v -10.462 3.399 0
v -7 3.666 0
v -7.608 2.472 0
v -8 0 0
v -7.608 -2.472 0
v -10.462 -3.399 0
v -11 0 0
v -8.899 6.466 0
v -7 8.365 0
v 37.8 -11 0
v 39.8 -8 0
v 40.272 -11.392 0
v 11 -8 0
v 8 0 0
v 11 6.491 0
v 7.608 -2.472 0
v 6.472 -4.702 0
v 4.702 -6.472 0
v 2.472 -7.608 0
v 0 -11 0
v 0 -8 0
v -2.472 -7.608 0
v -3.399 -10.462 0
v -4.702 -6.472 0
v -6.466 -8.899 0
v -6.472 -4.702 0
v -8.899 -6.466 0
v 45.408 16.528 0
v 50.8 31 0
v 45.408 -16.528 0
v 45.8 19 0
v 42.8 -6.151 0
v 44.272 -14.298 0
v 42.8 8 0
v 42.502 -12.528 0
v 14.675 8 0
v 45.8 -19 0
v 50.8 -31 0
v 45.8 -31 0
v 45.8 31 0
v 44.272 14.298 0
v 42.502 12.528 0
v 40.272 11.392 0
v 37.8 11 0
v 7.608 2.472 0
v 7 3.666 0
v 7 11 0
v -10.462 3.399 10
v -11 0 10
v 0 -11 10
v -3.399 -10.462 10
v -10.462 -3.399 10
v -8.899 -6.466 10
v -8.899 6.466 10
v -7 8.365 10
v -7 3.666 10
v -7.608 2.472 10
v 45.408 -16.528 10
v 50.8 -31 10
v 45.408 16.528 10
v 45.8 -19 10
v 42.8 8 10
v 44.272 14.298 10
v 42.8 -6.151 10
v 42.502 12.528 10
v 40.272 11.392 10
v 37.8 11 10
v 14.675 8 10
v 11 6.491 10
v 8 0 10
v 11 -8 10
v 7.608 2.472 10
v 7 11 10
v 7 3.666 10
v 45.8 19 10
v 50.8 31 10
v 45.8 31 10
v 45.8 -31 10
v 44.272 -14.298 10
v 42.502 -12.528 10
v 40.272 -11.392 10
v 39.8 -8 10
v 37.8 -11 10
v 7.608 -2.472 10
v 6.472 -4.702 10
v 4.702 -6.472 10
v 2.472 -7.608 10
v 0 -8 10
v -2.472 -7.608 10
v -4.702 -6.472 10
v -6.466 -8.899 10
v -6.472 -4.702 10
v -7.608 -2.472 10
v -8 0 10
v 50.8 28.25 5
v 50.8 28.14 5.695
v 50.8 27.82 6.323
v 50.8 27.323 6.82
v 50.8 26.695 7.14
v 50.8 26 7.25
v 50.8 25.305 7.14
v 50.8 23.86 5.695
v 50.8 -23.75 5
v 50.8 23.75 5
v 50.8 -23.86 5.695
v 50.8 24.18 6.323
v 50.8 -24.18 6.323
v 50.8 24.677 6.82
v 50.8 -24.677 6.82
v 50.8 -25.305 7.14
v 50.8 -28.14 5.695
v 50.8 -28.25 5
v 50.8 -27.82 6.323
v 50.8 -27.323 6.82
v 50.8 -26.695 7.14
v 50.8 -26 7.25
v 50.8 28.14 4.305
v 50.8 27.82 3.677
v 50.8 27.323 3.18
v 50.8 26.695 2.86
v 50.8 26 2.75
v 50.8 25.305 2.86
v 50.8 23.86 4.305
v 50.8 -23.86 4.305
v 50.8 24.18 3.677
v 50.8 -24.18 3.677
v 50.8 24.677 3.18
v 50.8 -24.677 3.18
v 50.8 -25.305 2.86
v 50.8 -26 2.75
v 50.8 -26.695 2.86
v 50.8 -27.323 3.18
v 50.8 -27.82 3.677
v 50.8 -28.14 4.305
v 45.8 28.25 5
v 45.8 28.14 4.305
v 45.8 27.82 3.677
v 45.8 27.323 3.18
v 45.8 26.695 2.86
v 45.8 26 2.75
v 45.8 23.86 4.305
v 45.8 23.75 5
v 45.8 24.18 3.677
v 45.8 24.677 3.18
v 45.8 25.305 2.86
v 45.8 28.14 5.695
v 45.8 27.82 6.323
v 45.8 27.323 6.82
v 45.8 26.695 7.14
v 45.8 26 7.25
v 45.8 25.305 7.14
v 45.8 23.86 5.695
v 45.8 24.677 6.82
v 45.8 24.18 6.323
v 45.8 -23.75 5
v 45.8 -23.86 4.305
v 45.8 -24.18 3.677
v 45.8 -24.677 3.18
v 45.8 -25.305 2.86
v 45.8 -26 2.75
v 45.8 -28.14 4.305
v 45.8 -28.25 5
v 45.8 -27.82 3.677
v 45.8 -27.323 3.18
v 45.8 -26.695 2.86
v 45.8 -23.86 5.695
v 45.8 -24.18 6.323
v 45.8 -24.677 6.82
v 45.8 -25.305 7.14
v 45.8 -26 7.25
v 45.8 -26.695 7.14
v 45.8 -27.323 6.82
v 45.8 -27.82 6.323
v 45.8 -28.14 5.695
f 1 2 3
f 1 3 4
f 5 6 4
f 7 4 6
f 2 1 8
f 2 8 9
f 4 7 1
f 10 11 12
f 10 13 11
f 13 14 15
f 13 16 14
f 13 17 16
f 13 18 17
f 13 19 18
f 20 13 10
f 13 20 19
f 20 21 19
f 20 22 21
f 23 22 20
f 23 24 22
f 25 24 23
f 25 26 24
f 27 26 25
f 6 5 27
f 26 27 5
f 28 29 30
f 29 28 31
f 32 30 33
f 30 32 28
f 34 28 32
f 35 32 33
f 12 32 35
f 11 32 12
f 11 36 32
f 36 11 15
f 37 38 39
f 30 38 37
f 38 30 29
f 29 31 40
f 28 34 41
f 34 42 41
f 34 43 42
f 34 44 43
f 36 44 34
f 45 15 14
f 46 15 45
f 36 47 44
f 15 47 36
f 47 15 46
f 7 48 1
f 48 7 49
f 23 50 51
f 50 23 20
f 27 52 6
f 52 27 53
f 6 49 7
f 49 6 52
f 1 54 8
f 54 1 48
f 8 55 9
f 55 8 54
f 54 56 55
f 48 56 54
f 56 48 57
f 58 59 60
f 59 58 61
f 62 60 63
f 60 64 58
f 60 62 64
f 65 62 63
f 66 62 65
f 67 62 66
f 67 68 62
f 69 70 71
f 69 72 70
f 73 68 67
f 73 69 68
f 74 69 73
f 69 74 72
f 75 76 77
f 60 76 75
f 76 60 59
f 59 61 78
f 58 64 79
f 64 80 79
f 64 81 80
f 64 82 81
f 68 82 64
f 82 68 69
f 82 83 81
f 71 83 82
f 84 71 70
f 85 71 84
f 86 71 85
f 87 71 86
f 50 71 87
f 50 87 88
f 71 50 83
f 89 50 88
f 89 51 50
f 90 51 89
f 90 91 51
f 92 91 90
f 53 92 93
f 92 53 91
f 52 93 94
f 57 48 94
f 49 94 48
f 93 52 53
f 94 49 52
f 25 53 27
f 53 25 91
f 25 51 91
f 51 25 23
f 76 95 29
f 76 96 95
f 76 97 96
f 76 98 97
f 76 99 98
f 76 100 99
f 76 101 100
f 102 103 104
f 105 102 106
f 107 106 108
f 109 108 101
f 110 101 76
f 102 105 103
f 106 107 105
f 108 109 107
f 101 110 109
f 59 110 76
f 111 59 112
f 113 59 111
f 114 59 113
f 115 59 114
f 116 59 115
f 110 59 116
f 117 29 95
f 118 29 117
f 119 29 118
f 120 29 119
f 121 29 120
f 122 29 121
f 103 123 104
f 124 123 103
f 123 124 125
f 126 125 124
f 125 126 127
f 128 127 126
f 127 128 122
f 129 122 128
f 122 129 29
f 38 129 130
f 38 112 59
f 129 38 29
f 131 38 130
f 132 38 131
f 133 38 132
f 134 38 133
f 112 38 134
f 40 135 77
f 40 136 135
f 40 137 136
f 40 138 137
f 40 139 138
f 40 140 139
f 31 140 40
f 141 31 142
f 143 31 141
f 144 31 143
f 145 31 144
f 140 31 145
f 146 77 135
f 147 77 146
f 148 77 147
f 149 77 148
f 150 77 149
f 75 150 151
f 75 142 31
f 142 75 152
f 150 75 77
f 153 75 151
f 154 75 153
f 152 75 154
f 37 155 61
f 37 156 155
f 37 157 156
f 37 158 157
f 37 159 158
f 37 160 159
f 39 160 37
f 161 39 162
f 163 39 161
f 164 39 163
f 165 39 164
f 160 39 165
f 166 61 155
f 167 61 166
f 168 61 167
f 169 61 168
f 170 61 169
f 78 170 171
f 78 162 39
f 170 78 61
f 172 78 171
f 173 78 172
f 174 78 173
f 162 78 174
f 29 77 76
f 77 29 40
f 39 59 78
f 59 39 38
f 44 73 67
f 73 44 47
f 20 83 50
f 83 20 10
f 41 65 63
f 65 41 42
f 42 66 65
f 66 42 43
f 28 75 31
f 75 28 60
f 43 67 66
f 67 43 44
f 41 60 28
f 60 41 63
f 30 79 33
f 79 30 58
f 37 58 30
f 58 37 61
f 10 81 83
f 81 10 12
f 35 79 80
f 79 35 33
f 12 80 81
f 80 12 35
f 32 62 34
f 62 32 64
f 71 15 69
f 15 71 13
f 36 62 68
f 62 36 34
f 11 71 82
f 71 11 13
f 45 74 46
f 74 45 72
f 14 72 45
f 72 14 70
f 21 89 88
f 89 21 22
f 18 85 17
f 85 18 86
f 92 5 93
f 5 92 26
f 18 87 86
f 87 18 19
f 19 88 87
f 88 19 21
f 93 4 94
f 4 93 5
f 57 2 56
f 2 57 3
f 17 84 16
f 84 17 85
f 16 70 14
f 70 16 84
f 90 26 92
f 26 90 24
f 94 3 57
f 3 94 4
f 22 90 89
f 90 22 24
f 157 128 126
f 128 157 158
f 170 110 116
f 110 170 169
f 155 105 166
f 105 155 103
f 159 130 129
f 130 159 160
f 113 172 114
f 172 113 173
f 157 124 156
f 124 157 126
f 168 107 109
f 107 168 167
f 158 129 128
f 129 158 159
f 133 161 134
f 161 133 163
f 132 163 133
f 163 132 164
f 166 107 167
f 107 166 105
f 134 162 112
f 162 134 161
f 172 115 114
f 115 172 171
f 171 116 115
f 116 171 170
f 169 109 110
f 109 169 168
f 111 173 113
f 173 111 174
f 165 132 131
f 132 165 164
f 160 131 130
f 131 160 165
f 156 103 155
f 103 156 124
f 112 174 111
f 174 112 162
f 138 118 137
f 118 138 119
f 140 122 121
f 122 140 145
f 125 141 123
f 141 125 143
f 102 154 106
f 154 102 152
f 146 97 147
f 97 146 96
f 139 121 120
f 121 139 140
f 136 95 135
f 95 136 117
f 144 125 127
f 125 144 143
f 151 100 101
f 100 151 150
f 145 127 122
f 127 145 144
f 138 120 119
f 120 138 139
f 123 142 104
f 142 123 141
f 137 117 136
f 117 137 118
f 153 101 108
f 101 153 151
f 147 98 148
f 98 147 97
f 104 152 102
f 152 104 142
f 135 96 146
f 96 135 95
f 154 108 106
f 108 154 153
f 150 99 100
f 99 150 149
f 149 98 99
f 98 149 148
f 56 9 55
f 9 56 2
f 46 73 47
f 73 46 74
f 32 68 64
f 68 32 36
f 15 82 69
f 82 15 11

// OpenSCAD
// Pipe hanger 
//John Finch 2-6-14


//User Inputs
inner_dia=16; 		//large inner hole
wall=3;  			//wall thickness of loop
tab_length=20; 		//mounting tab length
tab_thickness=5;		//mounting tab thickness
clip_width=10; 		//height of loop along Z axis
mount_hole_dia=4.5;	//screw hole diameter
opening=1;			//1 for a gap in loop, 0 for a solid loop
opening_width=14;	//opening width if enabled
center_to_wall_dist = 50.8; //Distance from center of support to wall
fillet_radius = 8;  //radius of fillet where support meets wall tabs


//end of user inputs
lightening_length = center_to_wall_dist - inner_dia/2-2*wall-tab_thickness;
lightening_width = inner_dia;
lightening_angle = atan(lightening_width/lightening_length);
cross_length = sqrt(lightening_length*lightening_length+lightening_width*lightening_width);

fn=20;


difference(){

	union(){
  	//place outer ring
	cylinder(h=clip_width,r1=inner_dia/2+wall,r2=inner_dia/2+wall,$fn=fn);

	//place mounting tabs
	translate([center_to_wall_dist-tab_thickness,-(inner_dia+2*wall+2*tab_length)/2,0])
	cube([tab_thickness,inner_dia+2*wall+2*tab_length,clip_width]);

	//place lower cube
	translate([0,-inner_dia/2-wall,0])
	cube([center_to_wall_dist,inner_dia+2*wall,clip_width]);

	//Place fillet cubes
	translate ([center_to_wall_dist-tab_thickness-fillet_radius,inner_dia/2+wall,0])
	cube([fillet_radius,fillet_radius,clip_width]);
	
	translate ([center_to_wall_dist-tab_thickness-fillet_radius,-inner_dia/2-wall-fillet_radius,0])
	cube([fillet_radius,fillet_radius,clip_width]);

	}

//cut fillet radai
translate ([center_to_wall_dist-tab_thickness-fillet_radius,inner_dia/2+wall+fillet_radius,0])
cylinder(h=clip_width,r1=fillet_radius, r2=fillet_radius,$fn=fn);

translate ([center_to_wall_dist-tab_thickness-fillet_radius,-inner_dia/2-wall-fillet_radius,0])
cylinder(h=clip_width,r1=fillet_radius, r2=fillet_radius,$fn=fn);

//Cut major lighting rectangle
translate([inner_dia/2+wall,-inner_dia/2,0])

cube([center_to_wall_dist - inner_dia/2-2*wall-tab_thickness,inner_dia,clip_width]);


//cut inner hole
cylinder(h=clip_width,r1=inner_dia/2,r2=inner_dia/2,$fn=fn);

//cut hole in mounting tab 1
translate([center_to_wall_dist-tab_thickness*1.01,-(inner_dia/2+wall+tab_length*3/4),clip_width/2])
rotate([0,90,0])
cylinder(h=tab_thickness*1.05,r1=mount_hole_dia/2,r2=mount_hole_dia/2,$fn=fn);

//cut hole in mounting tab 2
translate([center_to_wall_dist-tab_thickness*1.01,(inner_dia/2+wall+tab_length*3/4),clip_width/2])
rotate([0,90,0])
cylinder(h=tab_thickness*1.05,r1=mount_hole_dia/2,r2=mount_hole_dia/2,$fn=fn);

//slice ring
rotate([0,0,-90])
if (opening == 1)
	{
	translate([-(inner_dia/2+wall),-opening_width/2,0])
	cube([inner_dia/2,opening_width,clip_width]);
	}
}

//add strengthening bars to lightning hole
translate([inner_dia/2,inner_dia/2,0])
rotate([0,0,-lightening_angle])
cube([cross_length+2*wall,wall,clip_width]);

